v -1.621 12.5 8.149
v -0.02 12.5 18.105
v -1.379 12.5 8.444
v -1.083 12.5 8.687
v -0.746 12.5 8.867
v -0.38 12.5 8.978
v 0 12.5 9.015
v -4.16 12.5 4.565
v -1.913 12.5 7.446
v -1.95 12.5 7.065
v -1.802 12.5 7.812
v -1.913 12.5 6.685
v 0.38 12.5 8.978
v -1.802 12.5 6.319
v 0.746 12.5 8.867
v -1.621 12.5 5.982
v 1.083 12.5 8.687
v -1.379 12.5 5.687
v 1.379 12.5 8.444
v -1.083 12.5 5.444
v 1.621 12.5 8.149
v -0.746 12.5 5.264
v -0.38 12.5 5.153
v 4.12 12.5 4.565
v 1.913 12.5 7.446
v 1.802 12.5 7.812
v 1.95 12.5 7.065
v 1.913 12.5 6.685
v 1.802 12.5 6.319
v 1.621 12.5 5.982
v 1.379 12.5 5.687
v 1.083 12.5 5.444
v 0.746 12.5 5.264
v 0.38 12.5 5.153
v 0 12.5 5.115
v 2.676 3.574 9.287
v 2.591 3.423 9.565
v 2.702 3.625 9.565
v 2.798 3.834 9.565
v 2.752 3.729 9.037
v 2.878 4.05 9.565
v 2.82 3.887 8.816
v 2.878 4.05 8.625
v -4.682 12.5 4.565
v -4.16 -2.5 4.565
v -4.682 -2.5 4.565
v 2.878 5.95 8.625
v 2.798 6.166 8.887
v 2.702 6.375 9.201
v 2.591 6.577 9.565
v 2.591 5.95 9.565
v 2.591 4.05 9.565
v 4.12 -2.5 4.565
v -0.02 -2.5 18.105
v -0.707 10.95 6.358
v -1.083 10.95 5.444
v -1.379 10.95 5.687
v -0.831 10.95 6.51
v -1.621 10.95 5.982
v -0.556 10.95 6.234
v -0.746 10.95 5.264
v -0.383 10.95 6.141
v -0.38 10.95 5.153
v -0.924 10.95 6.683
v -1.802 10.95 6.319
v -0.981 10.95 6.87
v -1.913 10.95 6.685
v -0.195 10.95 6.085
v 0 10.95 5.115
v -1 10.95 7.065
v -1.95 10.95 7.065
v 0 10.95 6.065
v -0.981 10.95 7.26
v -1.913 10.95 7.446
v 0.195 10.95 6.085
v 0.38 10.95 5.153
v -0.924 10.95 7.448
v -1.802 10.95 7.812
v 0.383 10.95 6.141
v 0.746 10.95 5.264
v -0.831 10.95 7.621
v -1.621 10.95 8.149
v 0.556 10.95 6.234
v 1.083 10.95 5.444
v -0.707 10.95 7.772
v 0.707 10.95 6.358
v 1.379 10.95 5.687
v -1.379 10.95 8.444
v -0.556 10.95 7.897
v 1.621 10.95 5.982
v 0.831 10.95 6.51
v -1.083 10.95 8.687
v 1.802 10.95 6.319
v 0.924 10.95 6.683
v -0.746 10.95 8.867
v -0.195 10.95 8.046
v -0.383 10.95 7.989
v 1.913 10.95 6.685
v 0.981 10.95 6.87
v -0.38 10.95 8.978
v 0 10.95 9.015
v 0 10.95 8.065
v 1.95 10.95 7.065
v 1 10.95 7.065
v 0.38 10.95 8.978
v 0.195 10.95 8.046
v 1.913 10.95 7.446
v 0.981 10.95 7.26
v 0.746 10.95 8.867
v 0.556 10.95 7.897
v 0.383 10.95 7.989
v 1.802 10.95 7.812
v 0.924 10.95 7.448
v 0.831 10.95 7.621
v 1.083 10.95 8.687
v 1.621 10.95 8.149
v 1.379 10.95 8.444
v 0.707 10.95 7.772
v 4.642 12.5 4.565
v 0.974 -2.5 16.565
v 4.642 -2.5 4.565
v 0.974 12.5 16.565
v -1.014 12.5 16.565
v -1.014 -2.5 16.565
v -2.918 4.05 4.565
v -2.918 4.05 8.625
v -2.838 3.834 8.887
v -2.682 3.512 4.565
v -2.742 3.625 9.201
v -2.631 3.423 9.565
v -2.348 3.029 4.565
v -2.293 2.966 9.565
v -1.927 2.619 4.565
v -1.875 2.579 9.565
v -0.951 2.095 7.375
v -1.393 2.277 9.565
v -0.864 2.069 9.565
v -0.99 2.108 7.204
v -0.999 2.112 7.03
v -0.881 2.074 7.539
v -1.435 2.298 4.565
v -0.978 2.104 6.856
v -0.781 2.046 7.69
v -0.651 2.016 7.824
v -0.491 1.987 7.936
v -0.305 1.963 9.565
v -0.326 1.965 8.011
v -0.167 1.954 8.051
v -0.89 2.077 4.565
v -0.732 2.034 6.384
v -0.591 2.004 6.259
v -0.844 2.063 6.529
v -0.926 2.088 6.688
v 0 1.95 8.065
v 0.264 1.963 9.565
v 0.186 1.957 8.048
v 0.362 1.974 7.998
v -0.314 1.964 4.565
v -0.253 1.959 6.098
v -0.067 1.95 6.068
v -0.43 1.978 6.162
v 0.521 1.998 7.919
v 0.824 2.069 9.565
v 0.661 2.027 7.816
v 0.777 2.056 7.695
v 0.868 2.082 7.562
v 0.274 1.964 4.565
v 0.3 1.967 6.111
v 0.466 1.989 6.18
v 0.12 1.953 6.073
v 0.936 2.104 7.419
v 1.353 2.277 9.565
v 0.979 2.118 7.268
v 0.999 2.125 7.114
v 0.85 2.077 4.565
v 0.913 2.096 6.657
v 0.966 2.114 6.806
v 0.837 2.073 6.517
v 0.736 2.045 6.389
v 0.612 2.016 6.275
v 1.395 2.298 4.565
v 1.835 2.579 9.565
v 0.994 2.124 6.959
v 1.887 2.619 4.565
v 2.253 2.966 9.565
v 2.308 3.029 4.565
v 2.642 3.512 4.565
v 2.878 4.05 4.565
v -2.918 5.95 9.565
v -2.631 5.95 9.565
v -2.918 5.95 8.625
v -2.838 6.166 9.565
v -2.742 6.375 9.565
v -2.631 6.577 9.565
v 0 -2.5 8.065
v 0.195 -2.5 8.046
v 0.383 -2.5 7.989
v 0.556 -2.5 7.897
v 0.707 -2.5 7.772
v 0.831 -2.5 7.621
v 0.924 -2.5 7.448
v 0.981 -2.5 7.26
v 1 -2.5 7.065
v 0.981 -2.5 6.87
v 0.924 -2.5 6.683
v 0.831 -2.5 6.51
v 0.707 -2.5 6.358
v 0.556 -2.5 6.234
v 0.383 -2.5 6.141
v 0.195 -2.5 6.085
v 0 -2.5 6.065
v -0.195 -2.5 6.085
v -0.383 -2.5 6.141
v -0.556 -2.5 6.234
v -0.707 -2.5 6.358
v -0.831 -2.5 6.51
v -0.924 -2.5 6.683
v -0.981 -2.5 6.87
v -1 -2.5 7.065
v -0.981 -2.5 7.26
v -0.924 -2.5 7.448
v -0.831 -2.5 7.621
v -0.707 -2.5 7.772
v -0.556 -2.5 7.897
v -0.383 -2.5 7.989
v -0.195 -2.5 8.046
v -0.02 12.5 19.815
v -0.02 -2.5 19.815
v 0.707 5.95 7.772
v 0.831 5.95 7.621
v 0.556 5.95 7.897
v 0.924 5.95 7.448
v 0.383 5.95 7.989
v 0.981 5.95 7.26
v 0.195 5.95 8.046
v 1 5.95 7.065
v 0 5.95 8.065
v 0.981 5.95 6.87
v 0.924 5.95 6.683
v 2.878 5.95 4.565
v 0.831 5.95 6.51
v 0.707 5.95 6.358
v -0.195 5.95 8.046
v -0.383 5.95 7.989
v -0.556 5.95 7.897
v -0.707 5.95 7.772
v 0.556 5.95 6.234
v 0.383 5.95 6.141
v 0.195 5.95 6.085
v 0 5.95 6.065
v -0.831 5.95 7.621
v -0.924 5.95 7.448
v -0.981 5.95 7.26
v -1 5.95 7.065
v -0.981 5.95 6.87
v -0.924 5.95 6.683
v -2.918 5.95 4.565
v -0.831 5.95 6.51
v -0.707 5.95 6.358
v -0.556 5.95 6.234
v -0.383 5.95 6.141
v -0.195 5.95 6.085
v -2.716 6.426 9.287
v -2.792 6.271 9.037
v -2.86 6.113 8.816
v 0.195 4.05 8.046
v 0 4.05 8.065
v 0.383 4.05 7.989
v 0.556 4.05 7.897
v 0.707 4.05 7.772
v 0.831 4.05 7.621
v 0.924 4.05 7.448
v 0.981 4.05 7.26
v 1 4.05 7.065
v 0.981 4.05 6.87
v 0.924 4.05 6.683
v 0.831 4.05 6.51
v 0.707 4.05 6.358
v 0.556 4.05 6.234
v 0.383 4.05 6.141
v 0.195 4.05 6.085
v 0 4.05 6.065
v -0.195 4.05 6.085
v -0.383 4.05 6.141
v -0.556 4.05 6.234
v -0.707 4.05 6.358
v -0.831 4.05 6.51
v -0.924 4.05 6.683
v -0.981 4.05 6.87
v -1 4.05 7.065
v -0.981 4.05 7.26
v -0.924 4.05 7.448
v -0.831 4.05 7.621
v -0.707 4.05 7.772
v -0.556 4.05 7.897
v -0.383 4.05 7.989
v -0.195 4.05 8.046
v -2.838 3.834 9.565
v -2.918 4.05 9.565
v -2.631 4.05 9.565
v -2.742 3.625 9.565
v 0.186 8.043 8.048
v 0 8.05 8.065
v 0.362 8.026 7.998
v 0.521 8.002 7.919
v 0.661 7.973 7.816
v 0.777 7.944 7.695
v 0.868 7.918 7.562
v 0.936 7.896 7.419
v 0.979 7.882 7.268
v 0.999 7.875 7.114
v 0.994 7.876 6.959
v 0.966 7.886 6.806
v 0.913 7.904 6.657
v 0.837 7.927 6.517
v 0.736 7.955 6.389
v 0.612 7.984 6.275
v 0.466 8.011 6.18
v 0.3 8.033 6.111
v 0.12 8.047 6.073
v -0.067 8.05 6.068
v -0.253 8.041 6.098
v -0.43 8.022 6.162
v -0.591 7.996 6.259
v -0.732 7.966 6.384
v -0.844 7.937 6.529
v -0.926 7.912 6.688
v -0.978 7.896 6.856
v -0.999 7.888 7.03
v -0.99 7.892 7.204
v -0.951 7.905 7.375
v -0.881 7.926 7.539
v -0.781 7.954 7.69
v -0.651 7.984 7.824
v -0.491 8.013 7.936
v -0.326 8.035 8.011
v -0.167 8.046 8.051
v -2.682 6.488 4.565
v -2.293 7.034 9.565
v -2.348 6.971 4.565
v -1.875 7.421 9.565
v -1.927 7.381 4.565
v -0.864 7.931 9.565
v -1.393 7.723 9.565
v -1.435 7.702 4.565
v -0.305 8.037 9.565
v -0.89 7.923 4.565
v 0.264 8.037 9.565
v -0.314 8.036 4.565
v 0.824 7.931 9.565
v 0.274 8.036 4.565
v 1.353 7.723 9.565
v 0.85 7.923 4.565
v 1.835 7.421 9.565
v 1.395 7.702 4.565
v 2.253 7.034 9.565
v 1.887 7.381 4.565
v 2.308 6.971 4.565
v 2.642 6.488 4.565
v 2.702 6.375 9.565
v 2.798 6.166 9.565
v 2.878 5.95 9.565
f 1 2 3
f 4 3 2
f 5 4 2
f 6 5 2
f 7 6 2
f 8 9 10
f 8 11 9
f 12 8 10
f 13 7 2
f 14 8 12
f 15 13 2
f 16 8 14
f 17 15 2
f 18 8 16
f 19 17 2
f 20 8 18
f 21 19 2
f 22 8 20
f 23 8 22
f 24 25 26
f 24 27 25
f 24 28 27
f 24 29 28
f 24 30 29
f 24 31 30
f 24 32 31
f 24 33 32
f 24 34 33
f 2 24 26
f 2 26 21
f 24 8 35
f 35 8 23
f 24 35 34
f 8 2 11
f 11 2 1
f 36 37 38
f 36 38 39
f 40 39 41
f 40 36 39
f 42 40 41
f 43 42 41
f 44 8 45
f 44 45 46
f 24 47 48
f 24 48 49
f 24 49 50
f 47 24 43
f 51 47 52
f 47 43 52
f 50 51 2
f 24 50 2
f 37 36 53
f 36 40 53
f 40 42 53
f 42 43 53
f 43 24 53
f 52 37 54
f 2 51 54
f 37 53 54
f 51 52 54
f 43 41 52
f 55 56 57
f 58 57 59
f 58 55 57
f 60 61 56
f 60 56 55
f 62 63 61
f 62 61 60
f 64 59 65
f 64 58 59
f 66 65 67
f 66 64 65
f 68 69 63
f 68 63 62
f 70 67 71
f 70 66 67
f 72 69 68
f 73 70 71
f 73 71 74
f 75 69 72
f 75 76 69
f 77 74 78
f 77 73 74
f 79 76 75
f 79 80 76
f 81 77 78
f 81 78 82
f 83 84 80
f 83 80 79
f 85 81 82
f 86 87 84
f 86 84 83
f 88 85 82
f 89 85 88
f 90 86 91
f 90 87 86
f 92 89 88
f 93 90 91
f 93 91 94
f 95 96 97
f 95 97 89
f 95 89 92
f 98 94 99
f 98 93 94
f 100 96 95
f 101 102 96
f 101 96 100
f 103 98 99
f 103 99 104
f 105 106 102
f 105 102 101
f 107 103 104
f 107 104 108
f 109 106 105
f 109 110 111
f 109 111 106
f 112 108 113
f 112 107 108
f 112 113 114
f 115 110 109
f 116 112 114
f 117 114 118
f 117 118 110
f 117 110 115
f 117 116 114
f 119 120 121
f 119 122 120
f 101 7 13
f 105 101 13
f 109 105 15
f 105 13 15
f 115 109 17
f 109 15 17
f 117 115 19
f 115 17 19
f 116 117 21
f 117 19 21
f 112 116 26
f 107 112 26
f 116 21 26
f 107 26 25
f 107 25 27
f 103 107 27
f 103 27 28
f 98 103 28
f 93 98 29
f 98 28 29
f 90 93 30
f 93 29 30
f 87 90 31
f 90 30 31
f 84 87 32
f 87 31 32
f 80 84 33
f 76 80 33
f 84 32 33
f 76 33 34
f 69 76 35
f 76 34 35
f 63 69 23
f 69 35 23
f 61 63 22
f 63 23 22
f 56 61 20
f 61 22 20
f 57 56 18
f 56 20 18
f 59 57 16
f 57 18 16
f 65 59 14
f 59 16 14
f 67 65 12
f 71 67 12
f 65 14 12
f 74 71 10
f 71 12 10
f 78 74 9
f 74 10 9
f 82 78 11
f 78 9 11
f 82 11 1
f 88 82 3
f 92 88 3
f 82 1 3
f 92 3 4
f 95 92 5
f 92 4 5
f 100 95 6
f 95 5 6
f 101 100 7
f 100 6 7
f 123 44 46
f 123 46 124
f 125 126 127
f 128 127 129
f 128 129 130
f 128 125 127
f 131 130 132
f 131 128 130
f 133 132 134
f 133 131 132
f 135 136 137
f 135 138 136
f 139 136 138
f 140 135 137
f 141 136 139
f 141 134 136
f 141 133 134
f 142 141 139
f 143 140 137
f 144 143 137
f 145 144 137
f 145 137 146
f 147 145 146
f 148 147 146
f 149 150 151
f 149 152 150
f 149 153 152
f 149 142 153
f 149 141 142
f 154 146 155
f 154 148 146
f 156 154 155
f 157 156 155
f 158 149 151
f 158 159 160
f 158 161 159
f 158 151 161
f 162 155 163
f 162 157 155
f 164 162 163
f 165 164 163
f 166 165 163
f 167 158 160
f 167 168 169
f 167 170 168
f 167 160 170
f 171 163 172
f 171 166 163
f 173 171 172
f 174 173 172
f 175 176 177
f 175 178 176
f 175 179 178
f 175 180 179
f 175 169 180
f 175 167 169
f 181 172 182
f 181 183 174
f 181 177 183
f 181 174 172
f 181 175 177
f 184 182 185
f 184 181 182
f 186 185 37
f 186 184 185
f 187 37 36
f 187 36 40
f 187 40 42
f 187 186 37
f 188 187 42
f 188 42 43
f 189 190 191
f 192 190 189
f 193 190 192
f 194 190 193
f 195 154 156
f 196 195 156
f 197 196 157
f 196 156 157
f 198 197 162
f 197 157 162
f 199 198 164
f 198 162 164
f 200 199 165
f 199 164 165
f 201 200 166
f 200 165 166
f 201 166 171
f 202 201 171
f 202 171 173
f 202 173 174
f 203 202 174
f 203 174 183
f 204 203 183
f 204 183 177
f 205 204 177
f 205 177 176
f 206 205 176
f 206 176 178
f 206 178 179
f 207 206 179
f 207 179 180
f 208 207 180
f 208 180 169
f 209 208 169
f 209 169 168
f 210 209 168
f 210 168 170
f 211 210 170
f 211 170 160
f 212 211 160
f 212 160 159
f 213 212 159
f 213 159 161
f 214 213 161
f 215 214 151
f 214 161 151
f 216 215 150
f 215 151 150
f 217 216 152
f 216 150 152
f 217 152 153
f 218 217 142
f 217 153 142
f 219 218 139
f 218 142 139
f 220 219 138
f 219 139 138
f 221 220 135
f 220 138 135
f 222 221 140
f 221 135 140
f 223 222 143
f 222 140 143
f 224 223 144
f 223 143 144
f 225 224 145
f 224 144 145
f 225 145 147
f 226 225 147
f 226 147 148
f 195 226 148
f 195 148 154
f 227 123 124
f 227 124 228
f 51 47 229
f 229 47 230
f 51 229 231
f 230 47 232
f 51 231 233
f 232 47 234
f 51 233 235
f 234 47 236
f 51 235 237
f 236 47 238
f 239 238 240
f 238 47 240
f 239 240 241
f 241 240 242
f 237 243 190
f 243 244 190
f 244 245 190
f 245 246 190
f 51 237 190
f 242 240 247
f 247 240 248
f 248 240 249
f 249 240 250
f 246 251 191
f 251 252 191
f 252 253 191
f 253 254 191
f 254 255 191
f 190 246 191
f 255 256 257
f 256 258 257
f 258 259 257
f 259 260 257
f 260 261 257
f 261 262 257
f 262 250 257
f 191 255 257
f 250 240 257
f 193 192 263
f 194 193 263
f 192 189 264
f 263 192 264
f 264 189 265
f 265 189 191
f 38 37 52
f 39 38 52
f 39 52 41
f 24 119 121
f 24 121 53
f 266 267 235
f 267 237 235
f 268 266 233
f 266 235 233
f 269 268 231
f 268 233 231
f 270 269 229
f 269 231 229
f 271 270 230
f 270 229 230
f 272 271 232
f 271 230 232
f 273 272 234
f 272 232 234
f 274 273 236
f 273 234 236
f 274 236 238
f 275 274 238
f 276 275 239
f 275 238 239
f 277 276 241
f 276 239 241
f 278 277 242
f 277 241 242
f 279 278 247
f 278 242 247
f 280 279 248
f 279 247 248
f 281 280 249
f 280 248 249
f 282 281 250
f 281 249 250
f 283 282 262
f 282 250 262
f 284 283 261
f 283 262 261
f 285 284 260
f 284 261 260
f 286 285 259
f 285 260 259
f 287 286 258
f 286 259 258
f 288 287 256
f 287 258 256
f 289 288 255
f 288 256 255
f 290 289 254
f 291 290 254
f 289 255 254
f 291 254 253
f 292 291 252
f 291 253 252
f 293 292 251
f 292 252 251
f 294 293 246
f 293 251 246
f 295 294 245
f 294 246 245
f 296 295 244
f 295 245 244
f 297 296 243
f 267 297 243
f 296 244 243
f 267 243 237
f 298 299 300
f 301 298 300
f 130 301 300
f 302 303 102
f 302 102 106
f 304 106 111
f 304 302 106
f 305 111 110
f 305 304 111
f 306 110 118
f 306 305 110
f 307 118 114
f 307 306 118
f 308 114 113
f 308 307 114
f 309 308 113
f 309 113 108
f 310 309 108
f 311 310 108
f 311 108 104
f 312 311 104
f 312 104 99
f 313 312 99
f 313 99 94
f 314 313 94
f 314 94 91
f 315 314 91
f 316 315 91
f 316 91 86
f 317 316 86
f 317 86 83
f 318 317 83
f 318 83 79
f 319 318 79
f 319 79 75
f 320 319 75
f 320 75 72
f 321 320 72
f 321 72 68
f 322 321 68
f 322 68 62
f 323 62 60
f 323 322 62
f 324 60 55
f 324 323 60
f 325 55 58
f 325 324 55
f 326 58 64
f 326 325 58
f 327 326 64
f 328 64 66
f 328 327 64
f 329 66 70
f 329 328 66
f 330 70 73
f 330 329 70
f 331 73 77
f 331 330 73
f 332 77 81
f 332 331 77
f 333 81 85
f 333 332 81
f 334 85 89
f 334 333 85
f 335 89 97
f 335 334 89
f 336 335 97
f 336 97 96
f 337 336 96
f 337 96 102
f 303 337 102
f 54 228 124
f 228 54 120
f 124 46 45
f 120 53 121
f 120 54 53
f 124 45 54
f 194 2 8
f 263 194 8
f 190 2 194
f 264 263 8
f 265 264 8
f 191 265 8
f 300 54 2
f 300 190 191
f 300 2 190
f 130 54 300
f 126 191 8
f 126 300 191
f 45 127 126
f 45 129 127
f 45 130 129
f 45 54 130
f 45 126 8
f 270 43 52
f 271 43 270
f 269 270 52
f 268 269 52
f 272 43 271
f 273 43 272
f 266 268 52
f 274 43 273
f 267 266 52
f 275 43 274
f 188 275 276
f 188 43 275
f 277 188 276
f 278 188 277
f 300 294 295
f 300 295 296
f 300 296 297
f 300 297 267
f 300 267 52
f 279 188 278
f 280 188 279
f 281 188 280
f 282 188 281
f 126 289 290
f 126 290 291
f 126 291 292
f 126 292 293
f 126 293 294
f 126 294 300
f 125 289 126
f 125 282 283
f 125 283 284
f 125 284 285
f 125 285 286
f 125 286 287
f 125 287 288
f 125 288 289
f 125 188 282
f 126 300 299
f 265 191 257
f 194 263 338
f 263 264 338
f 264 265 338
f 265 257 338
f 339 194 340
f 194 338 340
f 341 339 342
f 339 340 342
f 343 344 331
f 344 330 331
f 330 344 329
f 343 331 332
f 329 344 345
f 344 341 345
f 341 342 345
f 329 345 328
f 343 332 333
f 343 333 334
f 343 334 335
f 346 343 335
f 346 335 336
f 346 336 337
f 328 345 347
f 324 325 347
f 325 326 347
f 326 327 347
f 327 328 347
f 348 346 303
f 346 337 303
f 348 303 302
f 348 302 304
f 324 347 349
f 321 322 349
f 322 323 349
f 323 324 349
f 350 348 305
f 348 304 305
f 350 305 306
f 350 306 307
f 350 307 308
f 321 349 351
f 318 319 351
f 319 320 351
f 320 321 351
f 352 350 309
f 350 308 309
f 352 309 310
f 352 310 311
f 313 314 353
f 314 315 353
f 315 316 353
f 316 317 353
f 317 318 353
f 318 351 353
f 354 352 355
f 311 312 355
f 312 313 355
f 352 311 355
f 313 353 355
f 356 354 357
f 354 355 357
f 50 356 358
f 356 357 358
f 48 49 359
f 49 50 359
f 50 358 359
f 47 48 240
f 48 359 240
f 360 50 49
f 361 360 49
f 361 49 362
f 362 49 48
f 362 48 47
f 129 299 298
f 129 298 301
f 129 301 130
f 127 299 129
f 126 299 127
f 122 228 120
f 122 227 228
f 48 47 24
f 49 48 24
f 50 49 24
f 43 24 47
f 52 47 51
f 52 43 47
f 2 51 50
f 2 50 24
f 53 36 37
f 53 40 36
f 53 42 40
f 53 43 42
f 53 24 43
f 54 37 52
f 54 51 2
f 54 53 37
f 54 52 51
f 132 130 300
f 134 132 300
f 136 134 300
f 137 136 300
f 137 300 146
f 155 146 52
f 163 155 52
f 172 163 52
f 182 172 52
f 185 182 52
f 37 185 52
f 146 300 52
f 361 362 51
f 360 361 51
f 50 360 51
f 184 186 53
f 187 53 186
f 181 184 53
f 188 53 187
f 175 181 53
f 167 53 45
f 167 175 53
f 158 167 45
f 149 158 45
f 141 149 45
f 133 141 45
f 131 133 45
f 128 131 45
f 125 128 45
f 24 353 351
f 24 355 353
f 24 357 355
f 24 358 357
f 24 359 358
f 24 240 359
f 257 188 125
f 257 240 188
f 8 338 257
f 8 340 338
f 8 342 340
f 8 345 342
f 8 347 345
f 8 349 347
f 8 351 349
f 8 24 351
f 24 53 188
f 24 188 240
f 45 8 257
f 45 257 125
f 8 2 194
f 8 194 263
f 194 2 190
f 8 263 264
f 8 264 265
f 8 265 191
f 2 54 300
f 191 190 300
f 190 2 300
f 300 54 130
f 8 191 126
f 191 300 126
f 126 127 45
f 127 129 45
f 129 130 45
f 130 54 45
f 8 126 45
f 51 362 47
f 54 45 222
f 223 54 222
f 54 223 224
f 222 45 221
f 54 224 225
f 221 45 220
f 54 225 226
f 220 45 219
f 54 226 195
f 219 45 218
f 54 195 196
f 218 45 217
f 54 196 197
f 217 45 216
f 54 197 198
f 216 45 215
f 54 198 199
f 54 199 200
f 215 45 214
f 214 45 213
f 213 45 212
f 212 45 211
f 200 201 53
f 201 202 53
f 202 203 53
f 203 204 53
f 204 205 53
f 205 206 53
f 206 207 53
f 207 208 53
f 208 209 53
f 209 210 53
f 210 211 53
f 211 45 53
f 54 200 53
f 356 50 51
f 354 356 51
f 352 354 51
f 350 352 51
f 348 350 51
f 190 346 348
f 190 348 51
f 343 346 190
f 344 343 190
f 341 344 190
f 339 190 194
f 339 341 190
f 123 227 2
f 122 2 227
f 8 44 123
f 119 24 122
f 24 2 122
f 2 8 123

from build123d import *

# Parameters (mm, degrees)
BOSS_EXTRUDE1_DEPTH      = 12.5
BOSS_EXTRUDE1_DEPTH_BACK = 2.5
CUT_EXTRUDE1_DEPTH       = 5
SKETCH5_R                = 1
CUT_EXTRUDE2_DEPTH       = 22.965235397
CUT_EXTRUDE2_DEPTH_BACK  = 22.965235397
SKETCH6_R                = 1.95
CUT_EXTRUDE3_DEPTH       = 1.55
SPLIT3_SURFACE_1_BACK    = 24.335
SPLIT3_SURFACE_1_DEPTH   = 48.67
SPLIT3_SURFACE_2_BACK    = 24.335
SPLIT3_SURFACE_2_DEPTH   = 48.67


with BuildPart() as part:
    # Sketch1 → Boss-Extrude1 (new, two sides)
    with BuildSketch(Plane(origin=(0, 0, 0), x_dir=(1, 0, 0), z_dir=(0, 1, 0))) as boss_extrude1_sk:
        Polygon((4.642363604, -4.565370009), (-4.68242218, -4.565370009), (-1.013654003, -16.565370009), (-0.020029288, -19.815370009), (0.973595427, -16.565370009), align=None)
    extrude(amount=BOSS_EXTRUDE1_DEPTH)
    extrude(boss_extrude1_sk.sketch, amount=-BOSS_EXTRUDE1_DEPTH_BACK)

    # Sketch2 → Cut-Extrude1 (cut)
    with BuildSketch(Plane(origin=(0, 0, 4.565370009), x_dir=(-1, 0, 0), z_dir=(0, 0, -1))):
        with BuildLine():
            Line((-2.878246061, 5.95), (2.918304637, 5.95))
            ThreePointArc((2.918304637, 5.95), (0.020029288, 8.05), (-2.878246061, 5.95))
        make_face()
        with BuildLine():
            Line((-2.878246061, 4.05), (2.918304637, 4.05))
            ThreePointArc((2.918304637, 4.05), (0.020029288, 1.95), (-2.878246061, 4.05))
        make_face()
    extrude(amount=-CUT_EXTRUDE1_DEPTH, mode=Mode.SUBTRACT)

    # Sketch5 → Cut-Extrude2 (cut, two sides)
    with BuildSketch(Plane(origin=(0, 5.74, 0), x_dir=(1, 0, 0), z_dir=(0, 1, 0))) as cut_extrude2_sk:
        with Locations(Location((0, -7.065370009, 0), (0, 0, 270))):
            Circle(SKETCH5_R)
    extrude(amount=CUT_EXTRUDE2_DEPTH, mode=Mode.SUBTRACT)
    extrude(cut_extrude2_sk.sketch, amount=-CUT_EXTRUDE2_DEPTH_BACK, mode=Mode.SUBTRACT)

    # Sketch6 → Cut-Extrude3 (cut)
    with BuildSketch(Plane(origin=(0, 12.5, 0), x_dir=(1, 0, 0), z_dir=(0, 1, 0))):
        with Locations(Location((0, -7.065370009, 0), (0, 0, 270))):
            Circle(SKETCH6_R)
    extrude(amount=-CUT_EXTRUDE3_DEPTH, mode=Mode.SUBTRACT)


with BuildPart() as body_2:
    # Split3: the piece behind the surface
    add(part.part)
    # Split3 surface: a surface, the sketch's curves swept straight by 48.67 mm
    with BuildLine(Plane(origin=(0, 12.5, 0), x_dir=(1, 0, 0), z_dir=(0, 1, 0)).offset(-SPLIT3_SURFACE_1_BACK), mode=Mode.PRIVATE) as split3_surface_1_path:
        Line((-4.68242218, -4.565370009), (-0.020029288, -19.815370009))
        Line((-0.020029288, -19.815370009), (4.642363604, -4.565370009))
        Line((4.642363604, -4.565370009), (4.119517726, -4.565370009))
        Line((4.119517726, -4.565370009), (-0.020029288, -18.105218199))
        Line((-0.020029288, -18.105218199), (-4.159576302, -4.565370009))
        Line((-4.159576302, -4.565370009), (-4.68242218, -4.565370009))
    split3_surface_1 = Shell.extrude(split3_surface_1_path.wire(), (0 * SPLIT3_SURFACE_1_DEPTH, 1 * SPLIT3_SURFACE_1_DEPTH, 0 * SPLIT3_SURFACE_1_DEPTH))
    split(bisect_by=split3_surface_1, keep=Keep.BOTTOM)


with BuildPart() as part_1:
    add(part.part)

    # Split3: split by a surface, the side it looks to stays
    # Split3 surface: a surface, the sketch's curves swept straight by 48.67 mm
    with BuildLine(Plane(origin=(0, 12.5, 0), x_dir=(1, 0, 0), z_dir=(0, 1, 0)).offset(-SPLIT3_SURFACE_2_BACK), mode=Mode.PRIVATE) as split3_surface_2_path:
        Line((-4.68242218, -4.565370009), (-0.020029288, -19.815370009))
        Line((-0.020029288, -19.815370009), (4.642363604, -4.565370009))
        Line((4.642363604, -4.565370009), (4.119517726, -4.565370009))
        Line((4.119517726, -4.565370009), (-0.020029288, -18.105218199))
        Line((-0.020029288, -18.105218199), (-4.159576302, -4.565370009))
        Line((-4.159576302, -4.565370009), (-4.68242218, -4.565370009))
    split3_surface_2 = Shell.extrude(split3_surface_2_path.wire(), (0 * SPLIT3_SURFACE_2_DEPTH, 1 * SPLIT3_SURFACE_2_DEPTH, 0 * SPLIT3_SURFACE_2_DEPTH))
    split(bisect_by=split3_surface_2, keep=Keep.TOP)


solid = Compound([body_2.part, part_1.part])
